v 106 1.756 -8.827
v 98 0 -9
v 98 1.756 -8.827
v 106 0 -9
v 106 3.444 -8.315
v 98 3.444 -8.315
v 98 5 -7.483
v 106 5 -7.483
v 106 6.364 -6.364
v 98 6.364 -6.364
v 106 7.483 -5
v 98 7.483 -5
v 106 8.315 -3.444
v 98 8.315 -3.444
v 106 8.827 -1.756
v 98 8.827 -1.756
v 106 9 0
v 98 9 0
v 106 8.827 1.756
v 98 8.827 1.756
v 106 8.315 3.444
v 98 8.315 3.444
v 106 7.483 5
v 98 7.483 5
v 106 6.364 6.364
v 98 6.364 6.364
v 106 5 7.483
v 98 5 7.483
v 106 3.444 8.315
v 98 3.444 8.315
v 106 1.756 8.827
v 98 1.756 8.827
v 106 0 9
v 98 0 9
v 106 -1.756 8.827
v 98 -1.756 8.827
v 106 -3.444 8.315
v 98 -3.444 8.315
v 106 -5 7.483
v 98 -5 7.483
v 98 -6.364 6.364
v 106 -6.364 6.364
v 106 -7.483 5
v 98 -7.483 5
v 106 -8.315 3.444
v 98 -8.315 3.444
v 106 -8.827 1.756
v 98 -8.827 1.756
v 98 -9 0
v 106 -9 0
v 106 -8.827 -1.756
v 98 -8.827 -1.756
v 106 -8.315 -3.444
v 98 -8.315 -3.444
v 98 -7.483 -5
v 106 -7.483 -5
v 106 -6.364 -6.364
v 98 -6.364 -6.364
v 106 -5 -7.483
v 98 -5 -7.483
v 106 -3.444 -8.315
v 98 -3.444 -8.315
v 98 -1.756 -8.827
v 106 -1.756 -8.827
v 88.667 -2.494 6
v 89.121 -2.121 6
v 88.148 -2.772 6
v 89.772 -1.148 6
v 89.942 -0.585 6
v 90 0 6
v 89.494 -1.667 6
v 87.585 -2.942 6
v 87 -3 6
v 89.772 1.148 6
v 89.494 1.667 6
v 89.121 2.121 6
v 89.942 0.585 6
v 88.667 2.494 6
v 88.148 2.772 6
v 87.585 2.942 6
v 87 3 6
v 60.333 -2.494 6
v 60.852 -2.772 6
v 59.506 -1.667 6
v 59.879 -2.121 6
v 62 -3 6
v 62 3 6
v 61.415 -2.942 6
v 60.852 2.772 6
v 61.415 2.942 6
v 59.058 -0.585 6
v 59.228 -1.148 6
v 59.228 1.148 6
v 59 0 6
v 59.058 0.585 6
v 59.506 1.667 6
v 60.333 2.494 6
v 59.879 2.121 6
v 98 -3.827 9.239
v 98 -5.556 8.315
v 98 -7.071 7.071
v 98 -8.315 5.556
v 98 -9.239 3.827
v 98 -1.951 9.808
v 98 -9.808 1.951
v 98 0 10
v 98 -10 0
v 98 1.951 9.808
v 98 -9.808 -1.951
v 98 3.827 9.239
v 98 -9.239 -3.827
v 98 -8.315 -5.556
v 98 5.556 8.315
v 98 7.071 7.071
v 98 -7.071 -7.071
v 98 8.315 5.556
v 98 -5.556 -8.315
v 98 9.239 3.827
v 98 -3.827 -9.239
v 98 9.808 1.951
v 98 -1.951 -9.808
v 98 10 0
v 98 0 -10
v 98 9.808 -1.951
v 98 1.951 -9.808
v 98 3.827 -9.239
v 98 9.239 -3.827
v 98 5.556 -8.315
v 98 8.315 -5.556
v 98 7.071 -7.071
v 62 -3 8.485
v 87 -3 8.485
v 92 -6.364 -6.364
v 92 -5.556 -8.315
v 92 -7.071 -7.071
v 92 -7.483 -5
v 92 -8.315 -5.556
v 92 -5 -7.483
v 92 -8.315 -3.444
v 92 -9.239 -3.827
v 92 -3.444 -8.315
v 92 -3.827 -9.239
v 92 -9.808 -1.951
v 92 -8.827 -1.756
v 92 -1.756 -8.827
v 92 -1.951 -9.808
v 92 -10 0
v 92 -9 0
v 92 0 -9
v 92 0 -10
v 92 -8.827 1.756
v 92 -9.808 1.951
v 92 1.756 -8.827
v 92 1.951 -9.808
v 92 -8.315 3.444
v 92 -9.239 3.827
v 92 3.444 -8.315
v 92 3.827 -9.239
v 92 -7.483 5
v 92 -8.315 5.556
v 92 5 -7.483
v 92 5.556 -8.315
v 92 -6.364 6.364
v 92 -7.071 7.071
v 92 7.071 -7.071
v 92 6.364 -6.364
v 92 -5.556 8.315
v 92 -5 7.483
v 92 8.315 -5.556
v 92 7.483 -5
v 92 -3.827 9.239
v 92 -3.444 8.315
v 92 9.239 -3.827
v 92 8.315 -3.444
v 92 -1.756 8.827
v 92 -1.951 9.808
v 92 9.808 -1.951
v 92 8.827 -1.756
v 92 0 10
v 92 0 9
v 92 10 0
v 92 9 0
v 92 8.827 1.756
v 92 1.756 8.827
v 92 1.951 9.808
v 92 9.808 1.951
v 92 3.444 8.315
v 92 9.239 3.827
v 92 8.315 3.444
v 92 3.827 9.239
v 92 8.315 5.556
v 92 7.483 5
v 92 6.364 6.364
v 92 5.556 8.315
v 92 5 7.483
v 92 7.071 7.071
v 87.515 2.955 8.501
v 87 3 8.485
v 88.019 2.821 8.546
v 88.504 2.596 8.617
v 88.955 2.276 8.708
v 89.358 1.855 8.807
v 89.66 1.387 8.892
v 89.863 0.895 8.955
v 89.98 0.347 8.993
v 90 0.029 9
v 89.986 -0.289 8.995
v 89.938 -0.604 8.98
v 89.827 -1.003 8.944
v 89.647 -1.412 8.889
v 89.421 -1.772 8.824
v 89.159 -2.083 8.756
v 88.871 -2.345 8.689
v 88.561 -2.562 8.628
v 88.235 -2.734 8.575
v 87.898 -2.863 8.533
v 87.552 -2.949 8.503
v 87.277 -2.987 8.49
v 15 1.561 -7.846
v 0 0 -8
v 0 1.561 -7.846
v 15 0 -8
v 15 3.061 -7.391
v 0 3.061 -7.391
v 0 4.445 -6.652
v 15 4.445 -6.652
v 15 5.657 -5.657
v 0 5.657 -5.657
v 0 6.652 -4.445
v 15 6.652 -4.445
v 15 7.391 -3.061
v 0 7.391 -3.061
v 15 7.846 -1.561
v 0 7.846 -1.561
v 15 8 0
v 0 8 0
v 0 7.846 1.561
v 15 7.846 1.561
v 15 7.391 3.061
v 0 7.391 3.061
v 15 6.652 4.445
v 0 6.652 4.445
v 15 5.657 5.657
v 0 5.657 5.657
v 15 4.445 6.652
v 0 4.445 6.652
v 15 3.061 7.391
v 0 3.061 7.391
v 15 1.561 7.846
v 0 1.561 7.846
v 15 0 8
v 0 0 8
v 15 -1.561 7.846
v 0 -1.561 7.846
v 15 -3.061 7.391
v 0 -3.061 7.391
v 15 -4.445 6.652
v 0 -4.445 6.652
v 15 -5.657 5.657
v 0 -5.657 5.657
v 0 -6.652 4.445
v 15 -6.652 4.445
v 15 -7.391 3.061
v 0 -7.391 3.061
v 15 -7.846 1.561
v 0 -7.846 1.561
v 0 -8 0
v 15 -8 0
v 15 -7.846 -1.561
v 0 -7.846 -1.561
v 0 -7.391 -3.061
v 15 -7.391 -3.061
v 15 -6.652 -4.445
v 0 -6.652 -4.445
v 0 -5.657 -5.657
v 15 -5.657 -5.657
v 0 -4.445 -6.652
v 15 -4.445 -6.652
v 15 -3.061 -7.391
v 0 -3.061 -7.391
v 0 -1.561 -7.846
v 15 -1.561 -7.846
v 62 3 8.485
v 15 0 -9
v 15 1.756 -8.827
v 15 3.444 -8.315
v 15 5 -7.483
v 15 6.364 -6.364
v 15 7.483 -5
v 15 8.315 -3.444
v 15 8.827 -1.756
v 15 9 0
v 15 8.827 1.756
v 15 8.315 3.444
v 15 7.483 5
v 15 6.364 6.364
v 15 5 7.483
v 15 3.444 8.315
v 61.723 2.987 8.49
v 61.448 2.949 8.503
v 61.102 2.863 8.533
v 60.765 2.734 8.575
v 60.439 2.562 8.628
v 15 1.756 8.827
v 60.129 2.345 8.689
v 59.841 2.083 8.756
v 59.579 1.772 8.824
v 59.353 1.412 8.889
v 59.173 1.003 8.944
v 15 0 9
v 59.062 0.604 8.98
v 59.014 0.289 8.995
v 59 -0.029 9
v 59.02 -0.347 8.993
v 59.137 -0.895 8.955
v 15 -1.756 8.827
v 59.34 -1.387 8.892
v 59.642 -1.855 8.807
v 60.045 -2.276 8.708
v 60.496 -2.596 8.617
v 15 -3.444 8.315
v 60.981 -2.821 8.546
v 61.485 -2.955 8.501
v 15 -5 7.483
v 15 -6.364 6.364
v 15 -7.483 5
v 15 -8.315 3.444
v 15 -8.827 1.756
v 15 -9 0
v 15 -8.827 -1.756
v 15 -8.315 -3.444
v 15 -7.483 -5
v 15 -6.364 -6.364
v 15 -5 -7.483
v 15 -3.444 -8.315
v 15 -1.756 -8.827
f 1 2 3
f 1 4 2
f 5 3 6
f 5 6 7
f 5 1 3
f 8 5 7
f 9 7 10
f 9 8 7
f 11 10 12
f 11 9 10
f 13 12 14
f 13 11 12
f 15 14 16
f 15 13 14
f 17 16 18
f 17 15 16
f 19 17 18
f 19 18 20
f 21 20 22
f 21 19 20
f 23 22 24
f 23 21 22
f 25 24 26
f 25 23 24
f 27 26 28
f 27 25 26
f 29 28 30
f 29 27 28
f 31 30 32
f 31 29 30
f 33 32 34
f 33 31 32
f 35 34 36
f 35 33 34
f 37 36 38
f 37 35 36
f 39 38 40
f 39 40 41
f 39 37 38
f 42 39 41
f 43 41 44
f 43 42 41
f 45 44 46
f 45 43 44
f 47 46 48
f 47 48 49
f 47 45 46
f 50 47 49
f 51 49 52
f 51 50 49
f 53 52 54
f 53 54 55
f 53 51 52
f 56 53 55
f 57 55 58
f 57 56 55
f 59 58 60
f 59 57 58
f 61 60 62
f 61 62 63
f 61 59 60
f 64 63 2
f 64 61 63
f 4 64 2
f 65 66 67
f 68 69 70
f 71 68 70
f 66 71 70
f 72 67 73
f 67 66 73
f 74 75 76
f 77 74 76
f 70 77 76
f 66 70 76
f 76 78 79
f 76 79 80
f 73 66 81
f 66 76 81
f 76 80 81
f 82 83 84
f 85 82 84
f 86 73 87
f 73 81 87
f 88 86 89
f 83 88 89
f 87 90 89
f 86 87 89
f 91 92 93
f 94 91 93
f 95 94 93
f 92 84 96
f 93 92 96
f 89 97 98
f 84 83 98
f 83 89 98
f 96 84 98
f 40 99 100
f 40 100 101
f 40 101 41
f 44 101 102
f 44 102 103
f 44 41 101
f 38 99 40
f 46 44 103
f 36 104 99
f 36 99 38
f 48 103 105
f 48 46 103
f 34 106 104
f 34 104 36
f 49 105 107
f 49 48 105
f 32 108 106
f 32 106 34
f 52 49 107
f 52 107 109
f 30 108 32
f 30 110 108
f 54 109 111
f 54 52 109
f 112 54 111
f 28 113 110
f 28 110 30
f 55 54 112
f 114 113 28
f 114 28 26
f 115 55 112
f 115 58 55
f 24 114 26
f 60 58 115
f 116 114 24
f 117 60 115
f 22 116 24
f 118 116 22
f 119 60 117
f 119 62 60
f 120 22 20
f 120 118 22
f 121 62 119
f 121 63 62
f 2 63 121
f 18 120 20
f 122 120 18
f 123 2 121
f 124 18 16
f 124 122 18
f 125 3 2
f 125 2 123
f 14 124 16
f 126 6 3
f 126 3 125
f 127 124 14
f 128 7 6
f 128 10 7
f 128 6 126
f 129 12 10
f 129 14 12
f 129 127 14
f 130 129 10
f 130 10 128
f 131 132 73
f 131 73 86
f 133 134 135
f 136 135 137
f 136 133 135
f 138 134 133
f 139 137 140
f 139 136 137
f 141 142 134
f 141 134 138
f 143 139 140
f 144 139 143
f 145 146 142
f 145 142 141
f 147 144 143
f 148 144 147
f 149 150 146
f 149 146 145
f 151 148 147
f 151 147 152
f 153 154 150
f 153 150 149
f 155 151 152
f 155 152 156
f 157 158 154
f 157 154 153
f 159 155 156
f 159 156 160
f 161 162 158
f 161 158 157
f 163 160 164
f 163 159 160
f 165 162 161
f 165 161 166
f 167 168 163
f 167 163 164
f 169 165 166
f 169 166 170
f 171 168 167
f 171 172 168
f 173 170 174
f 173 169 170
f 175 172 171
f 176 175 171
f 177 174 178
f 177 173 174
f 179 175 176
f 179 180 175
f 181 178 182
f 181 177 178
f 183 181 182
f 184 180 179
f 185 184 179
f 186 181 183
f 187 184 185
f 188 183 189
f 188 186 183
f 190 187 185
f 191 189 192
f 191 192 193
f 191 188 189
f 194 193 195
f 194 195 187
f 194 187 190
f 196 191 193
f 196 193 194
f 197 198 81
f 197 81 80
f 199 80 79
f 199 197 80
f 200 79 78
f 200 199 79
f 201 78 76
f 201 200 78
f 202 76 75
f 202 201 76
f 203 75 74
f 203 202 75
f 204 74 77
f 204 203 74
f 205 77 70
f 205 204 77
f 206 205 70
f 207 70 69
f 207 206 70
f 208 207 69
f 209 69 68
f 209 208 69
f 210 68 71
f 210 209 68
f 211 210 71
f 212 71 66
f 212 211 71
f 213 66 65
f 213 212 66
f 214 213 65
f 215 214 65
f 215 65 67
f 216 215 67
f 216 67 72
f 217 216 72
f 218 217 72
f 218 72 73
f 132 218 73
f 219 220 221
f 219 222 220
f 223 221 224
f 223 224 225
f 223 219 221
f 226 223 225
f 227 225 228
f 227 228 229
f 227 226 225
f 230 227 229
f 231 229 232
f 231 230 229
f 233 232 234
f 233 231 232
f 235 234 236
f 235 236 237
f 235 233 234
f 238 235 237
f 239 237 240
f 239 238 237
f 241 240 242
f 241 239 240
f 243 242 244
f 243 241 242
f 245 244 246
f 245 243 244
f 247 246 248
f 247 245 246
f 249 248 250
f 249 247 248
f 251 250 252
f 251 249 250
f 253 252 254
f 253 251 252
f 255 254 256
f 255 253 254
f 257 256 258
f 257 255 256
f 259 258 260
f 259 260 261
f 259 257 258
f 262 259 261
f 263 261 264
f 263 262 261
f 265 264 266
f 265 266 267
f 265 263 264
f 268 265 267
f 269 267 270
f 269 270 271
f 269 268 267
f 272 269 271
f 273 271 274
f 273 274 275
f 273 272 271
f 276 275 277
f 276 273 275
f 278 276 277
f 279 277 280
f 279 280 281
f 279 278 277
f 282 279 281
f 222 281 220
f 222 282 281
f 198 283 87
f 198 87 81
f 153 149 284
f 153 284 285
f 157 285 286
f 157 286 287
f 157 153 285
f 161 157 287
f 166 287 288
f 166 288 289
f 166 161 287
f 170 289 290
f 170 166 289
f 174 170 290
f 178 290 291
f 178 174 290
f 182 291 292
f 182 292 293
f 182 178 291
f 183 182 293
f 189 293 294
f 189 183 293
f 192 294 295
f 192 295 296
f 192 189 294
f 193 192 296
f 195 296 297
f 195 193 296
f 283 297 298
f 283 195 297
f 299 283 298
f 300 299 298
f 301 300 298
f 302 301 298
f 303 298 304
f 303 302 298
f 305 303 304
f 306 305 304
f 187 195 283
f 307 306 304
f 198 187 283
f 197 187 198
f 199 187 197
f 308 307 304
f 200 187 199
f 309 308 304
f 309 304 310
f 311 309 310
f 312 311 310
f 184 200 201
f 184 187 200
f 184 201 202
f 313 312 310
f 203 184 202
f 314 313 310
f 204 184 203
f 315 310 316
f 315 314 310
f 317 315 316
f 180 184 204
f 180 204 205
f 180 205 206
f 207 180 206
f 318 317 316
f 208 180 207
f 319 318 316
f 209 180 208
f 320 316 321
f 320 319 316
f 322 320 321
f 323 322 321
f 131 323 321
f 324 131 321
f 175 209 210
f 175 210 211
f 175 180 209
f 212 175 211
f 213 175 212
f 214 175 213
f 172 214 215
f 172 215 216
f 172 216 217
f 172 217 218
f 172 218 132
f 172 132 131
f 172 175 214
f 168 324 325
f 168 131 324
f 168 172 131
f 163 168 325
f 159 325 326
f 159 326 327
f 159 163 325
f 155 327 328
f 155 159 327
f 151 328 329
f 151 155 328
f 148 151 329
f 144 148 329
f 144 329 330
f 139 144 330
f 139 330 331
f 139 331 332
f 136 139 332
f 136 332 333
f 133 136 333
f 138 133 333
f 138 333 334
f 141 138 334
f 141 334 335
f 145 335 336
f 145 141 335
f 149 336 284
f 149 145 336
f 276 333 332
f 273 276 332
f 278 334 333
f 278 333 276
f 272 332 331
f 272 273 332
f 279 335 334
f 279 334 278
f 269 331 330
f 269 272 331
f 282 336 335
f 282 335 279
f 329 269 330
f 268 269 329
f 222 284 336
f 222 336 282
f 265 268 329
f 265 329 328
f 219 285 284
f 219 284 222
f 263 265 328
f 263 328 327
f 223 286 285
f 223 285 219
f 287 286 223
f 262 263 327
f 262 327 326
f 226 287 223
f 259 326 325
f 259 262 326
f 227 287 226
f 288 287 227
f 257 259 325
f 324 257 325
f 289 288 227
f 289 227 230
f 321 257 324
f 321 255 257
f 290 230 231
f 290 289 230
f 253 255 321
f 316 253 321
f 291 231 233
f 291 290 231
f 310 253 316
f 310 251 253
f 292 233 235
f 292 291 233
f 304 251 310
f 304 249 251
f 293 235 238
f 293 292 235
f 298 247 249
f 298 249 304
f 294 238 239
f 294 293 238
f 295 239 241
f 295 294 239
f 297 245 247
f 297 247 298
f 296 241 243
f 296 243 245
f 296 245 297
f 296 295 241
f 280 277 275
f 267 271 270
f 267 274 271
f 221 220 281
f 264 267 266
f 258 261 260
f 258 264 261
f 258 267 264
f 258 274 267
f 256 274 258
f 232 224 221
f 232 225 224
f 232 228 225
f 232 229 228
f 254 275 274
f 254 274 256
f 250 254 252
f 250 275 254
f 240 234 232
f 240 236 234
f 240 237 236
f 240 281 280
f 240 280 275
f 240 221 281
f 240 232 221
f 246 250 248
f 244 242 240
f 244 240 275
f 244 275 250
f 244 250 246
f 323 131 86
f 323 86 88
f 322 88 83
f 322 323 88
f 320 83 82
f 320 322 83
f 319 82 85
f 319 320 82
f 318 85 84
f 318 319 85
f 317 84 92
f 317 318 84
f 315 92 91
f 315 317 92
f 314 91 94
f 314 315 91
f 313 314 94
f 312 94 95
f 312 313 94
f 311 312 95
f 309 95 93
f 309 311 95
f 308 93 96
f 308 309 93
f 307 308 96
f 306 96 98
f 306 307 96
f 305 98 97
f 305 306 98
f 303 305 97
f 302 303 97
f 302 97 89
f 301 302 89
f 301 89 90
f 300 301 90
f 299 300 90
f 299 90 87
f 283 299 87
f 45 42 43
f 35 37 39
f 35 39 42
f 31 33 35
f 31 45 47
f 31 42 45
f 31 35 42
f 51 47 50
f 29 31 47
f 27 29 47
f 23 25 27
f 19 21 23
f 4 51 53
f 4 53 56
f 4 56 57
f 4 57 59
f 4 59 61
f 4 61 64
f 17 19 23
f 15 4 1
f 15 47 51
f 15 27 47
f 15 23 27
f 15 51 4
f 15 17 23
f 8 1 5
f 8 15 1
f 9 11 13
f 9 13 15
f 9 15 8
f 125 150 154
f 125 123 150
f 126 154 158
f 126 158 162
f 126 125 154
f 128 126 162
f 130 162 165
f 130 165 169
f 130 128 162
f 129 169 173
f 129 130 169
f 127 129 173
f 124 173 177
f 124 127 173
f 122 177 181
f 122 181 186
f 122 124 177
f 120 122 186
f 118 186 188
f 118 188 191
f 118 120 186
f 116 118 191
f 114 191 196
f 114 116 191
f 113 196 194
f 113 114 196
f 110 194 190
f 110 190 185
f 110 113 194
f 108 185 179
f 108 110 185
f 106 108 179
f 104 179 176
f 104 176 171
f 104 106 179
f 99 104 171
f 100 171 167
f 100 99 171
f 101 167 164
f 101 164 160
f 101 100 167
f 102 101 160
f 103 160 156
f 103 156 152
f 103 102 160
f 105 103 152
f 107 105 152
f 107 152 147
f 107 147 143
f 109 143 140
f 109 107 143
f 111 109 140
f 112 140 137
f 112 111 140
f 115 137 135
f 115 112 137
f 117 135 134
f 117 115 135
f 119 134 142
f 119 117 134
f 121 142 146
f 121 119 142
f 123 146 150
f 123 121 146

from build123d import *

# Parameters (mm, degrees)
CUT_EXTRUDE_2_DEPTH = 3


with BuildPart() as part:
    # 草图2 → 旋转1 (revolve)
    with BuildSketch(Plane(origin=(0, 0, 0), x_dir=(1, 0, 0), z_dir=(0, 1, 0))):
        Polygon((0, 0), (0, 8), (15, 8), (15, 9), (92, 9), (92, 10), (98, 10), (98, 9), (106, 9), (106, 0), align=None)
    revolve(axis=Axis((0, 0, 0), (1, 0, 0)))

    # 草图4 → 切除-拉伸2 (cut)
    with BuildSketch(Plane.XY.offset(9)):
        with BuildLine():
            Line((62, 3), (87, 3))
            ThreePointArc((87, 3), (90, 0), (87, -3))
            Line((87, -3), (62, -3))
            ThreePointArc((62, -3), (59, 0), (62, 3))
        make_face()
    extrude(amount=-CUT_EXTRUDE_2_DEPTH, mode=Mode.SUBTRACT)


solid = part.part
